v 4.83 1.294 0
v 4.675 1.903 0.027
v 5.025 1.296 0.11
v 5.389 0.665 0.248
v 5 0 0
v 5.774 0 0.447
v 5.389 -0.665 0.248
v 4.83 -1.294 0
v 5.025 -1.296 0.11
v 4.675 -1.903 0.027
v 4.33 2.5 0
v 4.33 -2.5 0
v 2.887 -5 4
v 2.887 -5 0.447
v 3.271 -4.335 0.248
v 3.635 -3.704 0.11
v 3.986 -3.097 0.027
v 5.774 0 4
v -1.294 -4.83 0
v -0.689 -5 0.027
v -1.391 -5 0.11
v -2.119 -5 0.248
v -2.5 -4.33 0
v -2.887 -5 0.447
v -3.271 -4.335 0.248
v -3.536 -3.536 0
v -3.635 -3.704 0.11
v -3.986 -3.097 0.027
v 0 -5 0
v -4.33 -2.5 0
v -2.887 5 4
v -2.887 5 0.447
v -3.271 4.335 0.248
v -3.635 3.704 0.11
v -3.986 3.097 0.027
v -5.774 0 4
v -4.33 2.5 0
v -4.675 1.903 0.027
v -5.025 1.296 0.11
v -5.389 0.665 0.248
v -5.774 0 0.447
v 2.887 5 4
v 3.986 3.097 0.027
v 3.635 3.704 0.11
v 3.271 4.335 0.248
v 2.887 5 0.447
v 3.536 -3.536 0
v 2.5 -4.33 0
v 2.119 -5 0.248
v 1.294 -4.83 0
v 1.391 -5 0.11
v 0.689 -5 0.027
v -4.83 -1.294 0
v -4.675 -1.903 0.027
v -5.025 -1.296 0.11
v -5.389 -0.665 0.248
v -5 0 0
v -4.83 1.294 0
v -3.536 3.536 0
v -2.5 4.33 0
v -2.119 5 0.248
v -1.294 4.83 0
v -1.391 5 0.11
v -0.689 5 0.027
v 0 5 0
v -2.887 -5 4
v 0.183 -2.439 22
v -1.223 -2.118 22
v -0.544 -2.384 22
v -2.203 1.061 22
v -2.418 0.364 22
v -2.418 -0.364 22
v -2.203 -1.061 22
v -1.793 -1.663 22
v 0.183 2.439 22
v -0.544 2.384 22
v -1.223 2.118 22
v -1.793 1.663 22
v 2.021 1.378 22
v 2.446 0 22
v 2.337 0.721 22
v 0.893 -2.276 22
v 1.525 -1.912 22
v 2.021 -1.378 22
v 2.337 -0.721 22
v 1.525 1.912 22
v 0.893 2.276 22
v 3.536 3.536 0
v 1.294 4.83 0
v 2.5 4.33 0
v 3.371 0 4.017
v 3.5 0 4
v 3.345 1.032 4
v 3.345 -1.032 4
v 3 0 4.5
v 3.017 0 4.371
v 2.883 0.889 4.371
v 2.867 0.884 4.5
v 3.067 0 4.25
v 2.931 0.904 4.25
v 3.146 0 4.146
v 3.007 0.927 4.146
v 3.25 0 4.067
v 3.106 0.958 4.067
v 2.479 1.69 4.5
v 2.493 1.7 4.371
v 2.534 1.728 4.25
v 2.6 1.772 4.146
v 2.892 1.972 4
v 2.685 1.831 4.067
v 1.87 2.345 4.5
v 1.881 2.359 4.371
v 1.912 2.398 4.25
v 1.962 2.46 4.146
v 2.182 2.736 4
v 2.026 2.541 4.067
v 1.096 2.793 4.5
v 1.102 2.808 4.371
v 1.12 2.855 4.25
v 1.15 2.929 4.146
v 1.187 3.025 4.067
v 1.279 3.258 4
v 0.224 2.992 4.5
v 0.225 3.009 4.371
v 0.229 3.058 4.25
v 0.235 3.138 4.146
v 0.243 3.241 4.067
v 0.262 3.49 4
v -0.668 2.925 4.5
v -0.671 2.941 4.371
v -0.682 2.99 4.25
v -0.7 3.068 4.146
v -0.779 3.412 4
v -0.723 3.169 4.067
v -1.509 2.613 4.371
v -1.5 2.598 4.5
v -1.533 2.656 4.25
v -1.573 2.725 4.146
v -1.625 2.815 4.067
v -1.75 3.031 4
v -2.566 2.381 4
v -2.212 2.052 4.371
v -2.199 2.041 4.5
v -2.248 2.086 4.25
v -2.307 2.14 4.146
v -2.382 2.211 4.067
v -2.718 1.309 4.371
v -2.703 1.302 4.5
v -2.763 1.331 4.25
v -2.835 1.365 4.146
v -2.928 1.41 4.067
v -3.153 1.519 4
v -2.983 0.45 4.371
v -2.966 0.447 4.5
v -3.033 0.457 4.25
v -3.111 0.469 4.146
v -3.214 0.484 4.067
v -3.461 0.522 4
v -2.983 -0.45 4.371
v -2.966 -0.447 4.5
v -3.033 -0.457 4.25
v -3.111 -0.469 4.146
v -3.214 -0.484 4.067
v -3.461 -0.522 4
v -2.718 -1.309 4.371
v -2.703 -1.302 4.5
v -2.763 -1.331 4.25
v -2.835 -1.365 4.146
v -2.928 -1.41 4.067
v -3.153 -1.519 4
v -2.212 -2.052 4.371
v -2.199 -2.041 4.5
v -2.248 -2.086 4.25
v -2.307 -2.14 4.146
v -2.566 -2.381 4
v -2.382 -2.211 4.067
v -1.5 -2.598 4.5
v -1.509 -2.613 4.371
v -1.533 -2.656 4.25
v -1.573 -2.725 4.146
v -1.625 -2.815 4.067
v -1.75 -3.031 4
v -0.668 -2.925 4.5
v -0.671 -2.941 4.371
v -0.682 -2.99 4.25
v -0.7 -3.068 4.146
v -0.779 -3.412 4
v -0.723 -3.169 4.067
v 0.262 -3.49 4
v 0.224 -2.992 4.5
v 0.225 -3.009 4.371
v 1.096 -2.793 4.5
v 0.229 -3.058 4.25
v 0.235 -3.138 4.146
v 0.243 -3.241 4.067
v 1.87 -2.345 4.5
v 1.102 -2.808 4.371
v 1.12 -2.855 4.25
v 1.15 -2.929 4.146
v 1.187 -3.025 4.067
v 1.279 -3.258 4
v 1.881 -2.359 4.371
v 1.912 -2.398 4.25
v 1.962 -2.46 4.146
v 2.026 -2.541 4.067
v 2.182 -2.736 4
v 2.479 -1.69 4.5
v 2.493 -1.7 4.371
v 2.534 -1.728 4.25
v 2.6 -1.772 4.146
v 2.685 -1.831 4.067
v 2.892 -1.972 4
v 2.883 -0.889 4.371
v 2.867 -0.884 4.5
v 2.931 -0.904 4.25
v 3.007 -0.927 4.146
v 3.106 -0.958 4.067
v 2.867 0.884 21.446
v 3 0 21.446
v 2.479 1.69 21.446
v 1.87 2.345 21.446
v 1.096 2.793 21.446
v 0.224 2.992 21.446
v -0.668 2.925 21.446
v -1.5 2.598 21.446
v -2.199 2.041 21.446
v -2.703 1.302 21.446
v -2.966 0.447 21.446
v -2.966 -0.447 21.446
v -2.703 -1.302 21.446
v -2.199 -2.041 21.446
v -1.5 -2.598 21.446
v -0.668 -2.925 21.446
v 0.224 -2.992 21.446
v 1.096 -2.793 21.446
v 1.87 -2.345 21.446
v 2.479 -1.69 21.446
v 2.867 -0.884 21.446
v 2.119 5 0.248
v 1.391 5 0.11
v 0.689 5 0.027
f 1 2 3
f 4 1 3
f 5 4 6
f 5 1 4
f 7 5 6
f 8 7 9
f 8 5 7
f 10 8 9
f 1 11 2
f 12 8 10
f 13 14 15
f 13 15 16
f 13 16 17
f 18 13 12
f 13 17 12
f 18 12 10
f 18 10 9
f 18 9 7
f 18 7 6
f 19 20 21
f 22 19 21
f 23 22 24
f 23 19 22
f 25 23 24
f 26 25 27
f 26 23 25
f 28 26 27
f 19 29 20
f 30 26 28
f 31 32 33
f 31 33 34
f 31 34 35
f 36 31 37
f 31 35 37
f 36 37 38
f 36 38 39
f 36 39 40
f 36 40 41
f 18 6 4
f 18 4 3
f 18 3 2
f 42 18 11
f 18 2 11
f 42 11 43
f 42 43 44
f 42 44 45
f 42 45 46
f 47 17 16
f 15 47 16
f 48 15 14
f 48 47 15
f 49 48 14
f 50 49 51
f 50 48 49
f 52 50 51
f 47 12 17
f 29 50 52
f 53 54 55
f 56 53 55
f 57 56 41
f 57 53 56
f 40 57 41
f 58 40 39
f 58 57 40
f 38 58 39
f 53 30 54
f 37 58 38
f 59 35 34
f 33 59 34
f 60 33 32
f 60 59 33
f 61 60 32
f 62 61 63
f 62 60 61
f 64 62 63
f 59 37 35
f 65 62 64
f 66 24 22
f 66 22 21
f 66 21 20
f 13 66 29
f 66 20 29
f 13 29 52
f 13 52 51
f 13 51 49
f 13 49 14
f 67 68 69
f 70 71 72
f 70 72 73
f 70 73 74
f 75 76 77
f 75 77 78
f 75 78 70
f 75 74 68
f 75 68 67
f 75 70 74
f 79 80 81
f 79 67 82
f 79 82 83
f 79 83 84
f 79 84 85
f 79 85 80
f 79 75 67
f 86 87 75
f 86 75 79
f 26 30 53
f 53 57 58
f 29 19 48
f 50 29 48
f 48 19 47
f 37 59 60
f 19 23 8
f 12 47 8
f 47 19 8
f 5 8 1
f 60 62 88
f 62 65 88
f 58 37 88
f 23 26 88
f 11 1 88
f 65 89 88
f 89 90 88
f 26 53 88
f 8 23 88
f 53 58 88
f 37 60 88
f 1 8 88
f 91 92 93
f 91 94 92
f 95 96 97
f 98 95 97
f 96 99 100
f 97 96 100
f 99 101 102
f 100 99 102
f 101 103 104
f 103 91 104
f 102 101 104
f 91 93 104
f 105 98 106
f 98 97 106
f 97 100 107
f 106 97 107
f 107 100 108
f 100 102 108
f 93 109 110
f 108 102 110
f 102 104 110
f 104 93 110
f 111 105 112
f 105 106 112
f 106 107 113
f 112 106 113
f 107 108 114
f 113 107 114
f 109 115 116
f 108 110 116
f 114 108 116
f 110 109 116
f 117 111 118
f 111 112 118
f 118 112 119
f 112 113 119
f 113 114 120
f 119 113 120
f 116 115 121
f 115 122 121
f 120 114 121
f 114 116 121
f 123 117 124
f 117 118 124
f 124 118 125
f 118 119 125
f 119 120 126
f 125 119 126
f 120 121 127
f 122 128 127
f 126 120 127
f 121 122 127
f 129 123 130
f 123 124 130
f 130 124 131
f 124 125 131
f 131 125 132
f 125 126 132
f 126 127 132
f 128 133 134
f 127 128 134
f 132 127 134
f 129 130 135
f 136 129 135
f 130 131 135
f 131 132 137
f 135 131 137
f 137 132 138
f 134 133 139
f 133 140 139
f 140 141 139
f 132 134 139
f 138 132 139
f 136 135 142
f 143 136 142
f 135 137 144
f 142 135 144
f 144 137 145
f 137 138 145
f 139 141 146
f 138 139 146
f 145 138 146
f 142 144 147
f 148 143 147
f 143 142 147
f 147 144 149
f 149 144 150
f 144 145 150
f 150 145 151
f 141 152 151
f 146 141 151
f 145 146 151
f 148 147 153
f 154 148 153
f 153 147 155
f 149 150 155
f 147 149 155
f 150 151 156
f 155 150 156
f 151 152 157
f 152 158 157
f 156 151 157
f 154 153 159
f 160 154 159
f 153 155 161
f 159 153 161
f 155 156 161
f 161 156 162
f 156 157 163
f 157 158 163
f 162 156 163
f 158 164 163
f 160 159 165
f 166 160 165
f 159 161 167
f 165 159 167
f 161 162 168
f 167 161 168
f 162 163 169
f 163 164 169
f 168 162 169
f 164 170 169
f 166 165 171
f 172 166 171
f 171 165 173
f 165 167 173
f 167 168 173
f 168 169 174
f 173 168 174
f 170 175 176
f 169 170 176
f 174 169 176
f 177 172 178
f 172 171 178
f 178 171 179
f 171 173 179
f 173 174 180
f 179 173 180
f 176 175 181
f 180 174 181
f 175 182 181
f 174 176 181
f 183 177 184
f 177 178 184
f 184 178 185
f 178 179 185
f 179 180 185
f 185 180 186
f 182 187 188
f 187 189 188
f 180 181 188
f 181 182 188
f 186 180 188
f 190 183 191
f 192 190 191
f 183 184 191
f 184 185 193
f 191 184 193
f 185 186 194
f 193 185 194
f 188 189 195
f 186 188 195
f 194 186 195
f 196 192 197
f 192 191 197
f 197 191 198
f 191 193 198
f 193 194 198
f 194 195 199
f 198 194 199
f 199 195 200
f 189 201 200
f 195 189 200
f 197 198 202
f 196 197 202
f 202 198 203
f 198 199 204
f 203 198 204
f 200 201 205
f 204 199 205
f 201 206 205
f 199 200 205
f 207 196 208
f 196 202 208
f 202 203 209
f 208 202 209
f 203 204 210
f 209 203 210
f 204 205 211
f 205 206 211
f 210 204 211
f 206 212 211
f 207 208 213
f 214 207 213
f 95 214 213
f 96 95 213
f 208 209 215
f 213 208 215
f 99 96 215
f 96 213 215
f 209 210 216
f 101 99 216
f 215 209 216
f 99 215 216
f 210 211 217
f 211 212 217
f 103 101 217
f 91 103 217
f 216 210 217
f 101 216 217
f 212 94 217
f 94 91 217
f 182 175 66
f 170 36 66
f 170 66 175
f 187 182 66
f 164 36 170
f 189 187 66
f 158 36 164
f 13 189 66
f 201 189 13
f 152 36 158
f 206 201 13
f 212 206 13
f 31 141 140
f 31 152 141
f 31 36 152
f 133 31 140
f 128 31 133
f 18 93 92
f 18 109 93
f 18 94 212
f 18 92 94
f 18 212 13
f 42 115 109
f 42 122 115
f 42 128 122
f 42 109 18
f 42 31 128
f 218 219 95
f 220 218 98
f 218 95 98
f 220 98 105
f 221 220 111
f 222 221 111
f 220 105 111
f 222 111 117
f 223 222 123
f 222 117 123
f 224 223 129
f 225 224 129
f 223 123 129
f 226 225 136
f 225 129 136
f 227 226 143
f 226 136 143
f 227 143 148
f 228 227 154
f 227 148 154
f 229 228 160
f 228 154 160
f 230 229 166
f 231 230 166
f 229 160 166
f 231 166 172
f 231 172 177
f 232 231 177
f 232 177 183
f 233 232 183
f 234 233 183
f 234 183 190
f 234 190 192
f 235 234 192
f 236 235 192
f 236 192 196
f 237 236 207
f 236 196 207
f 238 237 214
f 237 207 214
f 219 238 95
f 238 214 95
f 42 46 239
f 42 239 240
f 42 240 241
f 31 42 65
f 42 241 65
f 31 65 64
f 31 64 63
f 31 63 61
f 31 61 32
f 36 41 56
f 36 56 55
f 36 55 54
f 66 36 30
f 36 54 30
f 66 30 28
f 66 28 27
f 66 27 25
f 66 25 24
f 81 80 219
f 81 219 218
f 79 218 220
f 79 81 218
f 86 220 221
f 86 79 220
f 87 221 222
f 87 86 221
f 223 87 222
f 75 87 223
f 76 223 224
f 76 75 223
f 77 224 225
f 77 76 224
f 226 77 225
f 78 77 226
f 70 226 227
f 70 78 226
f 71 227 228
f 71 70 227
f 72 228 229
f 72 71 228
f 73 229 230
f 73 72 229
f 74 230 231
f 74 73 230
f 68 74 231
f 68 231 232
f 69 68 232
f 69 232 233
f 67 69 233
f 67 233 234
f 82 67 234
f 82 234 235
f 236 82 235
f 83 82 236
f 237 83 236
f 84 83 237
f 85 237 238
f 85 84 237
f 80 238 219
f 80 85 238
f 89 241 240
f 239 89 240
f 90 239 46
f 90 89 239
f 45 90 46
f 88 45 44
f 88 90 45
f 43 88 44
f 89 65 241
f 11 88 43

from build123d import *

# Parameters (mm, degrees)
EXTRUDE_1_DEPTH = 4
SKETCH_2_R      = 3
EXTRUDE_2_DEPTH = 18
CHAMFER_1_SIZE  = 0.5545
FILLET_1_R      = 0.5


with BuildPart() as part:
    # Эскиз1 → Бобышка-Вытянуть1 (new body)
    with BuildSketch(Plane.XY):
        Polygon((-2.886751346, 5), (-5.773502692, 0), (-2.886751346, -5), (2.886751346, -5), (5.773502692, 0), (2.886751346, 5), align=None)
    extrude(amount=EXTRUDE_1_DEPTH)

    # Эскиз2 → Бобышка-Вытянуть2 (add)
    with BuildSketch(Plane.XY.offset(4)):
        Circle(SKETCH_2_R)
    extrude(amount=EXTRUDE_2_DEPTH)

    # Эскиз3 → Вырез-Повернуть1 (revolve, cut)
    with BuildSketch(Plane(origin=(0, 0, 0), x_dir=(0, 0, -1), z_dir=(1, 0, 0))):
        Polygon((0, 5), (0, 6.24), (-0.715914334, 6.24), align=None)
    revolve(axis=Axis((0, 0, 1000), (0, 0, -1)), mode=Mode.SUBTRACT)

    # Фаска1
    chamfer_1_edges = [part.edges().sort_by_distance(p)[0] for p in [
        (-3, 0, 22),
    ]]
    chamfer(chamfer_1_edges, length=CHAMFER_1_SIZE)

    # Скругление1
    fillet_1_edges = [part.edges().sort_by_distance(p)[0] for p in [
        (-3, 0, 4),
    ]]
    fillet(fillet_1_edges, radius=FILLET_1_R)


solid = part.part
